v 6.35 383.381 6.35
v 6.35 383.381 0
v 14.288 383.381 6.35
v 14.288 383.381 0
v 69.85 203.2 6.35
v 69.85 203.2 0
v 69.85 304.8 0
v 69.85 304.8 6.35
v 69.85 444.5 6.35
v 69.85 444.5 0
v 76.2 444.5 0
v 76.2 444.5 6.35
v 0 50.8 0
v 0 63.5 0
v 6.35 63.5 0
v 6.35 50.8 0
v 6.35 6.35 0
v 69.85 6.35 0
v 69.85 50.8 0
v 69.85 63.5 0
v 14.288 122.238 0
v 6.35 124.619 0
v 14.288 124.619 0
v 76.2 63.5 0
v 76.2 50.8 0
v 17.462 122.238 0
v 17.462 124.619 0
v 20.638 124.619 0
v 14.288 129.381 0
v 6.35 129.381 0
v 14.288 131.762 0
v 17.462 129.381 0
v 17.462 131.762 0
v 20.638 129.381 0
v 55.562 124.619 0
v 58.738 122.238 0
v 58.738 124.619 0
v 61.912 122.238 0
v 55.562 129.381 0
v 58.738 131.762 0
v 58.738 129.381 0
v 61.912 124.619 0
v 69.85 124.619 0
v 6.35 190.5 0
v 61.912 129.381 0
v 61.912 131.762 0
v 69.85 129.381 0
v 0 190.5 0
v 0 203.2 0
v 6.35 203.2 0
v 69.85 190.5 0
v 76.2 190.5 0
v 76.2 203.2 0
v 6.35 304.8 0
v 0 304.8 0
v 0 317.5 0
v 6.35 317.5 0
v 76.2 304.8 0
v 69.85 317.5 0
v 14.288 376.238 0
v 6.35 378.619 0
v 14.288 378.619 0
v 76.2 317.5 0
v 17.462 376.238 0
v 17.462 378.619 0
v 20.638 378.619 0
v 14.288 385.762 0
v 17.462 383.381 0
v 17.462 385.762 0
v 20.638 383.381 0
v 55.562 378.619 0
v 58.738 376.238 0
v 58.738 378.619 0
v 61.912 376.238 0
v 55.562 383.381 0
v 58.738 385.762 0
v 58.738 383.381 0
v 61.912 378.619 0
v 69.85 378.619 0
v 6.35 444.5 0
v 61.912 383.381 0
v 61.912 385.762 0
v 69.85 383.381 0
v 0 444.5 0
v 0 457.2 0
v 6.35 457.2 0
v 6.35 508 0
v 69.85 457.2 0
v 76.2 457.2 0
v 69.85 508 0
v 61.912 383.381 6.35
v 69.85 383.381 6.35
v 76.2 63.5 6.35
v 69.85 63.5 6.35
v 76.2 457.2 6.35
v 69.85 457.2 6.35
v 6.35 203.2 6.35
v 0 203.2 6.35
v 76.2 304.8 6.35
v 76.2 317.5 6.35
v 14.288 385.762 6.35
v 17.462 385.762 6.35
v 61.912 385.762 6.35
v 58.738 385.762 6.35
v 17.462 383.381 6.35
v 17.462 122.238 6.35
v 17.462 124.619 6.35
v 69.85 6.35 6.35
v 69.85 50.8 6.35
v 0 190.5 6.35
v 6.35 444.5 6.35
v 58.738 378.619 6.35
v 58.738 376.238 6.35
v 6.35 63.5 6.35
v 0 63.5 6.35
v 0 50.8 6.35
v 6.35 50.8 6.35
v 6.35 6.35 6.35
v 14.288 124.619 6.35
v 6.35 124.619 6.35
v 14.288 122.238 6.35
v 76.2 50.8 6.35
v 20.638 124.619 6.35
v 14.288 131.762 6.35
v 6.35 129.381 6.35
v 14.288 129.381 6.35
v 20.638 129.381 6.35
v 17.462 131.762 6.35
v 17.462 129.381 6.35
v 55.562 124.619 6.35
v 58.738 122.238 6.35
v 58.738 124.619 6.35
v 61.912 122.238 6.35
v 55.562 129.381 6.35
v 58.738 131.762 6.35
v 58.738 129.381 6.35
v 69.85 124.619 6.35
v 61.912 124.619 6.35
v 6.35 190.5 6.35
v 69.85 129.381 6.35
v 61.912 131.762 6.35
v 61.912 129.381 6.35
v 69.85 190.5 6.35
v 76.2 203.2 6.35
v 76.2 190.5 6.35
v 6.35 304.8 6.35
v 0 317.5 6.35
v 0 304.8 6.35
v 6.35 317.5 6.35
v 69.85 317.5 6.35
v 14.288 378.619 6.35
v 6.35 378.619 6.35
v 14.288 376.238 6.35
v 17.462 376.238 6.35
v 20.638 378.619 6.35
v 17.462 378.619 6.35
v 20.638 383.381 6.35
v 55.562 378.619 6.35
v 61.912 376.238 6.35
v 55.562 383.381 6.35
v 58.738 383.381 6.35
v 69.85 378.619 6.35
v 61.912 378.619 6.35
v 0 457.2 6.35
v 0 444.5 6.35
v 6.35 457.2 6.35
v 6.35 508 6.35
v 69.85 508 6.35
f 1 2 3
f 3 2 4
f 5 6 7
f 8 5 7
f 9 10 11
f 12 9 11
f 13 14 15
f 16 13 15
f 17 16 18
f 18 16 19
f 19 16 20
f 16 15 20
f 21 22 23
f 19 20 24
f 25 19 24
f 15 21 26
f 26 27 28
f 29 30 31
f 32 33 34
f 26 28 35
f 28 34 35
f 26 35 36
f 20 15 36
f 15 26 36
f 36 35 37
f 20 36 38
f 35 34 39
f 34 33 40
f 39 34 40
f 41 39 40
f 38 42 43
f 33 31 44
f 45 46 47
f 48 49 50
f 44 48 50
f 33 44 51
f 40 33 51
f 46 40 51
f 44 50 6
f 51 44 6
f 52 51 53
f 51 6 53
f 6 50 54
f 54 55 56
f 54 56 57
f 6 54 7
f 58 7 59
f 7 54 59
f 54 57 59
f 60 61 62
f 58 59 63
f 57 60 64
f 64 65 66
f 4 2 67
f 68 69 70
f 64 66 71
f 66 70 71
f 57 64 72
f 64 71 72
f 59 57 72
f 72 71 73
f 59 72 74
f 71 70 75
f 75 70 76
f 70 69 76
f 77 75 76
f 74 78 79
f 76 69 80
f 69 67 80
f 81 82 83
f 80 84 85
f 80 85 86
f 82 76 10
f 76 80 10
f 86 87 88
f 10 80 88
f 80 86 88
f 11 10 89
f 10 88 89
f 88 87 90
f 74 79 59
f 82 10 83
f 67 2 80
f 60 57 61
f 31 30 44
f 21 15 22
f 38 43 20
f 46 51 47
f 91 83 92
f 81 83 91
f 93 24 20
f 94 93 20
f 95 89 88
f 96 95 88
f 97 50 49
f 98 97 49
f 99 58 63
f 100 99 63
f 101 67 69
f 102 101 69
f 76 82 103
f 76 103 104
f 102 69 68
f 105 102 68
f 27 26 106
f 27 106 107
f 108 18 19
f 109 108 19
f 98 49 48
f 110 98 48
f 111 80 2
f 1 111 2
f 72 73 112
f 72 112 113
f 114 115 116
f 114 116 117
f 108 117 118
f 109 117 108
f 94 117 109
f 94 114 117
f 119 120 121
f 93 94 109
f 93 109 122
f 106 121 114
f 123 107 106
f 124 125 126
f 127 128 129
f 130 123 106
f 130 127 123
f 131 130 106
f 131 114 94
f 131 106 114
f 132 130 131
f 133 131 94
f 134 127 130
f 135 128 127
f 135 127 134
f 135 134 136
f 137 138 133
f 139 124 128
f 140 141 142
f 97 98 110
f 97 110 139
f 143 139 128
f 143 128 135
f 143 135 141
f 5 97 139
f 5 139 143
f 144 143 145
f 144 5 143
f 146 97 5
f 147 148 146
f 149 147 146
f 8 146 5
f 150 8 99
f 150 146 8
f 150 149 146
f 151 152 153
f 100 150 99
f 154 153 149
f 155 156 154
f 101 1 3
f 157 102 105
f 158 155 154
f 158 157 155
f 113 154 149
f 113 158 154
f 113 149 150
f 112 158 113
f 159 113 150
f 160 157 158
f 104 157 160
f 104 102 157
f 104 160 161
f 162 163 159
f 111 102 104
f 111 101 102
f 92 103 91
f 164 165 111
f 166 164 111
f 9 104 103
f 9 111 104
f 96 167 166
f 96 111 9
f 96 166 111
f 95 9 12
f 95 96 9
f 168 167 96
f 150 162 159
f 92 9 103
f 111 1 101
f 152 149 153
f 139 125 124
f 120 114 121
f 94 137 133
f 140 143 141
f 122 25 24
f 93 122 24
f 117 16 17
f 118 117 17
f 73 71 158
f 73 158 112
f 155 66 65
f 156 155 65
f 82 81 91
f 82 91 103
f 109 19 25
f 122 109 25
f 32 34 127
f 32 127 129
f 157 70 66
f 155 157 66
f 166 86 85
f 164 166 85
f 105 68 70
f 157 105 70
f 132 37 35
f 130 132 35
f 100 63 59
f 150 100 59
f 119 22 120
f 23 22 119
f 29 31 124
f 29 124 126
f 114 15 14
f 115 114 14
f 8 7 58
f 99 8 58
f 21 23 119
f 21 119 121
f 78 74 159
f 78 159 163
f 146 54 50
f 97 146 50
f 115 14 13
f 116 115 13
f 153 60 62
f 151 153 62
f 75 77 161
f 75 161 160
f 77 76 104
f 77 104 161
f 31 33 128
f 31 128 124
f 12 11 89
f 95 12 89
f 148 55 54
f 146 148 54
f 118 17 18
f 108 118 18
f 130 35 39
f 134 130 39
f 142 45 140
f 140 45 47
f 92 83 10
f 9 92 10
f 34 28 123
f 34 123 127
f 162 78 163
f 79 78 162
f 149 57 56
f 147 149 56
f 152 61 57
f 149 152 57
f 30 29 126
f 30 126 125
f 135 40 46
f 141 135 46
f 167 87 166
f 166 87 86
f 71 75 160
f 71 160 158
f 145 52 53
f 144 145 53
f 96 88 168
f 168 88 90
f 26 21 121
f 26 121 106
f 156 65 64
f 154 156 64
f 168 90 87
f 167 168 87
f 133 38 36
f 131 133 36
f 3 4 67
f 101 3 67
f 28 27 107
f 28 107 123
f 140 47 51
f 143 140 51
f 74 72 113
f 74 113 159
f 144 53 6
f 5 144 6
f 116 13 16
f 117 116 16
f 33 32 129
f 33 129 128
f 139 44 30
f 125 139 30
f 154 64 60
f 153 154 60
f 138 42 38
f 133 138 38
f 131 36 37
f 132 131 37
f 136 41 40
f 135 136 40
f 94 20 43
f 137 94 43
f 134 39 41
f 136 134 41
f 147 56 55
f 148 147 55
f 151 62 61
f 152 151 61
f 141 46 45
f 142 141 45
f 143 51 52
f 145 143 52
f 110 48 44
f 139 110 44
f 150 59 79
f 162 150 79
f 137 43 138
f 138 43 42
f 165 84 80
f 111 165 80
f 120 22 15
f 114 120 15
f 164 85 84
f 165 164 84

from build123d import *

# Parameters (mm, degrees)
BOSS_EXTRUDE1_DEPTH = 6.35
CUT_EXTRUDE1_DEPTH  = 6.35


with BuildPart() as part:
    # Sketch1 → Boss-Extrude1 (new body)
    with BuildSketch(Plane.XY):
        Polygon((76.2, 190.5), (76.2, 203.2), (69.85, 203.2), (69.85, 304.8), (76.2, 304.8), (76.2, 317.5), (69.85, 317.5), (69.85, 444.5), (76.2, 444.5), (76.2, 457.2), (69.85, 457.2), (69.85, 508), (6.35, 508), (6.35, 457.2), (0, 457.2), (0, 444.5), (6.35, 444.5), (6.35, 317.5), (0, 317.5), (0, 304.8), (6.35, 304.8), (6.35, 203.2), (0, 203.2), (0, 190.5), (6.35, 190.5), (6.35, 63.5), (0, 63.5), (0, 50.8), (6.35, 50.8), (6.35, 6.35), (69.85, 6.35), (69.85, 50.8), (76.2, 50.8), (76.2, 63.5), (69.85, 63.5), (69.85, 190.5), align=None)
    extrude(amount=BOSS_EXTRUDE1_DEPTH)

    # Sketch2 → Cut-Extrude1 (cut)
    with BuildSketch(Plane(origin=(0, 0, 0), x_dir=(-1, 0, 0), z_dir=(0, 0, -1))):
        Polygon((-58.7375, 124.61875), (-55.5625, 124.61875), (-55.5625, 129.38125), (-58.7375, 129.38125), (-58.7375, 131.7625), (-61.9125, 131.7625), (-61.9125, 129.38125), (-69.85, 129.38125), (-69.85, 124.61875), (-61.9125, 124.61875), (-61.9125, 122.2375), (-58.7375, 122.2375), align=None)
        Polygon((-6.35, 124.61875), (-14.2875, 124.61875), (-14.2875, 122.2375), (-17.4625, 122.2375), (-17.4625, 124.61875), (-20.6375, 124.61875), (-20.6375, 129.38125), (-17.4625, 129.38125), (-17.4625, 131.7625), (-14.2875, 131.7625), (-14.2875, 129.38125), (-6.35, 129.38125), align=None)
        Polygon((-17.4625, 383.38125), (-20.6375, 383.38125), (-20.6375, 378.61875), (-17.4625, 378.61875), (-17.4625, 376.2375), (-14.2875, 376.2375), (-14.2875, 378.61875), (-6.35, 378.61875), (-6.35, 383.38125), (-14.2875, 383.38125), (-14.2875, 385.7625), (-17.4625, 385.7625), align=None)
        Polygon((-69.85, 383.38125), (-61.9125, 383.38125), (-61.9125, 385.7625), (-58.7375, 385.7625), (-58.7375, 383.38125), (-55.5625, 383.38125), (-55.5625, 378.61875), (-58.7375, 378.61875), (-58.7375, 376.2375), (-61.9125, 376.2375), (-61.9125, 378.61875), (-69.85, 378.61875), align=None)
    extrude(amount=-CUT_EXTRUDE1_DEPTH, mode=Mode.SUBTRACT)


solid = part.part
